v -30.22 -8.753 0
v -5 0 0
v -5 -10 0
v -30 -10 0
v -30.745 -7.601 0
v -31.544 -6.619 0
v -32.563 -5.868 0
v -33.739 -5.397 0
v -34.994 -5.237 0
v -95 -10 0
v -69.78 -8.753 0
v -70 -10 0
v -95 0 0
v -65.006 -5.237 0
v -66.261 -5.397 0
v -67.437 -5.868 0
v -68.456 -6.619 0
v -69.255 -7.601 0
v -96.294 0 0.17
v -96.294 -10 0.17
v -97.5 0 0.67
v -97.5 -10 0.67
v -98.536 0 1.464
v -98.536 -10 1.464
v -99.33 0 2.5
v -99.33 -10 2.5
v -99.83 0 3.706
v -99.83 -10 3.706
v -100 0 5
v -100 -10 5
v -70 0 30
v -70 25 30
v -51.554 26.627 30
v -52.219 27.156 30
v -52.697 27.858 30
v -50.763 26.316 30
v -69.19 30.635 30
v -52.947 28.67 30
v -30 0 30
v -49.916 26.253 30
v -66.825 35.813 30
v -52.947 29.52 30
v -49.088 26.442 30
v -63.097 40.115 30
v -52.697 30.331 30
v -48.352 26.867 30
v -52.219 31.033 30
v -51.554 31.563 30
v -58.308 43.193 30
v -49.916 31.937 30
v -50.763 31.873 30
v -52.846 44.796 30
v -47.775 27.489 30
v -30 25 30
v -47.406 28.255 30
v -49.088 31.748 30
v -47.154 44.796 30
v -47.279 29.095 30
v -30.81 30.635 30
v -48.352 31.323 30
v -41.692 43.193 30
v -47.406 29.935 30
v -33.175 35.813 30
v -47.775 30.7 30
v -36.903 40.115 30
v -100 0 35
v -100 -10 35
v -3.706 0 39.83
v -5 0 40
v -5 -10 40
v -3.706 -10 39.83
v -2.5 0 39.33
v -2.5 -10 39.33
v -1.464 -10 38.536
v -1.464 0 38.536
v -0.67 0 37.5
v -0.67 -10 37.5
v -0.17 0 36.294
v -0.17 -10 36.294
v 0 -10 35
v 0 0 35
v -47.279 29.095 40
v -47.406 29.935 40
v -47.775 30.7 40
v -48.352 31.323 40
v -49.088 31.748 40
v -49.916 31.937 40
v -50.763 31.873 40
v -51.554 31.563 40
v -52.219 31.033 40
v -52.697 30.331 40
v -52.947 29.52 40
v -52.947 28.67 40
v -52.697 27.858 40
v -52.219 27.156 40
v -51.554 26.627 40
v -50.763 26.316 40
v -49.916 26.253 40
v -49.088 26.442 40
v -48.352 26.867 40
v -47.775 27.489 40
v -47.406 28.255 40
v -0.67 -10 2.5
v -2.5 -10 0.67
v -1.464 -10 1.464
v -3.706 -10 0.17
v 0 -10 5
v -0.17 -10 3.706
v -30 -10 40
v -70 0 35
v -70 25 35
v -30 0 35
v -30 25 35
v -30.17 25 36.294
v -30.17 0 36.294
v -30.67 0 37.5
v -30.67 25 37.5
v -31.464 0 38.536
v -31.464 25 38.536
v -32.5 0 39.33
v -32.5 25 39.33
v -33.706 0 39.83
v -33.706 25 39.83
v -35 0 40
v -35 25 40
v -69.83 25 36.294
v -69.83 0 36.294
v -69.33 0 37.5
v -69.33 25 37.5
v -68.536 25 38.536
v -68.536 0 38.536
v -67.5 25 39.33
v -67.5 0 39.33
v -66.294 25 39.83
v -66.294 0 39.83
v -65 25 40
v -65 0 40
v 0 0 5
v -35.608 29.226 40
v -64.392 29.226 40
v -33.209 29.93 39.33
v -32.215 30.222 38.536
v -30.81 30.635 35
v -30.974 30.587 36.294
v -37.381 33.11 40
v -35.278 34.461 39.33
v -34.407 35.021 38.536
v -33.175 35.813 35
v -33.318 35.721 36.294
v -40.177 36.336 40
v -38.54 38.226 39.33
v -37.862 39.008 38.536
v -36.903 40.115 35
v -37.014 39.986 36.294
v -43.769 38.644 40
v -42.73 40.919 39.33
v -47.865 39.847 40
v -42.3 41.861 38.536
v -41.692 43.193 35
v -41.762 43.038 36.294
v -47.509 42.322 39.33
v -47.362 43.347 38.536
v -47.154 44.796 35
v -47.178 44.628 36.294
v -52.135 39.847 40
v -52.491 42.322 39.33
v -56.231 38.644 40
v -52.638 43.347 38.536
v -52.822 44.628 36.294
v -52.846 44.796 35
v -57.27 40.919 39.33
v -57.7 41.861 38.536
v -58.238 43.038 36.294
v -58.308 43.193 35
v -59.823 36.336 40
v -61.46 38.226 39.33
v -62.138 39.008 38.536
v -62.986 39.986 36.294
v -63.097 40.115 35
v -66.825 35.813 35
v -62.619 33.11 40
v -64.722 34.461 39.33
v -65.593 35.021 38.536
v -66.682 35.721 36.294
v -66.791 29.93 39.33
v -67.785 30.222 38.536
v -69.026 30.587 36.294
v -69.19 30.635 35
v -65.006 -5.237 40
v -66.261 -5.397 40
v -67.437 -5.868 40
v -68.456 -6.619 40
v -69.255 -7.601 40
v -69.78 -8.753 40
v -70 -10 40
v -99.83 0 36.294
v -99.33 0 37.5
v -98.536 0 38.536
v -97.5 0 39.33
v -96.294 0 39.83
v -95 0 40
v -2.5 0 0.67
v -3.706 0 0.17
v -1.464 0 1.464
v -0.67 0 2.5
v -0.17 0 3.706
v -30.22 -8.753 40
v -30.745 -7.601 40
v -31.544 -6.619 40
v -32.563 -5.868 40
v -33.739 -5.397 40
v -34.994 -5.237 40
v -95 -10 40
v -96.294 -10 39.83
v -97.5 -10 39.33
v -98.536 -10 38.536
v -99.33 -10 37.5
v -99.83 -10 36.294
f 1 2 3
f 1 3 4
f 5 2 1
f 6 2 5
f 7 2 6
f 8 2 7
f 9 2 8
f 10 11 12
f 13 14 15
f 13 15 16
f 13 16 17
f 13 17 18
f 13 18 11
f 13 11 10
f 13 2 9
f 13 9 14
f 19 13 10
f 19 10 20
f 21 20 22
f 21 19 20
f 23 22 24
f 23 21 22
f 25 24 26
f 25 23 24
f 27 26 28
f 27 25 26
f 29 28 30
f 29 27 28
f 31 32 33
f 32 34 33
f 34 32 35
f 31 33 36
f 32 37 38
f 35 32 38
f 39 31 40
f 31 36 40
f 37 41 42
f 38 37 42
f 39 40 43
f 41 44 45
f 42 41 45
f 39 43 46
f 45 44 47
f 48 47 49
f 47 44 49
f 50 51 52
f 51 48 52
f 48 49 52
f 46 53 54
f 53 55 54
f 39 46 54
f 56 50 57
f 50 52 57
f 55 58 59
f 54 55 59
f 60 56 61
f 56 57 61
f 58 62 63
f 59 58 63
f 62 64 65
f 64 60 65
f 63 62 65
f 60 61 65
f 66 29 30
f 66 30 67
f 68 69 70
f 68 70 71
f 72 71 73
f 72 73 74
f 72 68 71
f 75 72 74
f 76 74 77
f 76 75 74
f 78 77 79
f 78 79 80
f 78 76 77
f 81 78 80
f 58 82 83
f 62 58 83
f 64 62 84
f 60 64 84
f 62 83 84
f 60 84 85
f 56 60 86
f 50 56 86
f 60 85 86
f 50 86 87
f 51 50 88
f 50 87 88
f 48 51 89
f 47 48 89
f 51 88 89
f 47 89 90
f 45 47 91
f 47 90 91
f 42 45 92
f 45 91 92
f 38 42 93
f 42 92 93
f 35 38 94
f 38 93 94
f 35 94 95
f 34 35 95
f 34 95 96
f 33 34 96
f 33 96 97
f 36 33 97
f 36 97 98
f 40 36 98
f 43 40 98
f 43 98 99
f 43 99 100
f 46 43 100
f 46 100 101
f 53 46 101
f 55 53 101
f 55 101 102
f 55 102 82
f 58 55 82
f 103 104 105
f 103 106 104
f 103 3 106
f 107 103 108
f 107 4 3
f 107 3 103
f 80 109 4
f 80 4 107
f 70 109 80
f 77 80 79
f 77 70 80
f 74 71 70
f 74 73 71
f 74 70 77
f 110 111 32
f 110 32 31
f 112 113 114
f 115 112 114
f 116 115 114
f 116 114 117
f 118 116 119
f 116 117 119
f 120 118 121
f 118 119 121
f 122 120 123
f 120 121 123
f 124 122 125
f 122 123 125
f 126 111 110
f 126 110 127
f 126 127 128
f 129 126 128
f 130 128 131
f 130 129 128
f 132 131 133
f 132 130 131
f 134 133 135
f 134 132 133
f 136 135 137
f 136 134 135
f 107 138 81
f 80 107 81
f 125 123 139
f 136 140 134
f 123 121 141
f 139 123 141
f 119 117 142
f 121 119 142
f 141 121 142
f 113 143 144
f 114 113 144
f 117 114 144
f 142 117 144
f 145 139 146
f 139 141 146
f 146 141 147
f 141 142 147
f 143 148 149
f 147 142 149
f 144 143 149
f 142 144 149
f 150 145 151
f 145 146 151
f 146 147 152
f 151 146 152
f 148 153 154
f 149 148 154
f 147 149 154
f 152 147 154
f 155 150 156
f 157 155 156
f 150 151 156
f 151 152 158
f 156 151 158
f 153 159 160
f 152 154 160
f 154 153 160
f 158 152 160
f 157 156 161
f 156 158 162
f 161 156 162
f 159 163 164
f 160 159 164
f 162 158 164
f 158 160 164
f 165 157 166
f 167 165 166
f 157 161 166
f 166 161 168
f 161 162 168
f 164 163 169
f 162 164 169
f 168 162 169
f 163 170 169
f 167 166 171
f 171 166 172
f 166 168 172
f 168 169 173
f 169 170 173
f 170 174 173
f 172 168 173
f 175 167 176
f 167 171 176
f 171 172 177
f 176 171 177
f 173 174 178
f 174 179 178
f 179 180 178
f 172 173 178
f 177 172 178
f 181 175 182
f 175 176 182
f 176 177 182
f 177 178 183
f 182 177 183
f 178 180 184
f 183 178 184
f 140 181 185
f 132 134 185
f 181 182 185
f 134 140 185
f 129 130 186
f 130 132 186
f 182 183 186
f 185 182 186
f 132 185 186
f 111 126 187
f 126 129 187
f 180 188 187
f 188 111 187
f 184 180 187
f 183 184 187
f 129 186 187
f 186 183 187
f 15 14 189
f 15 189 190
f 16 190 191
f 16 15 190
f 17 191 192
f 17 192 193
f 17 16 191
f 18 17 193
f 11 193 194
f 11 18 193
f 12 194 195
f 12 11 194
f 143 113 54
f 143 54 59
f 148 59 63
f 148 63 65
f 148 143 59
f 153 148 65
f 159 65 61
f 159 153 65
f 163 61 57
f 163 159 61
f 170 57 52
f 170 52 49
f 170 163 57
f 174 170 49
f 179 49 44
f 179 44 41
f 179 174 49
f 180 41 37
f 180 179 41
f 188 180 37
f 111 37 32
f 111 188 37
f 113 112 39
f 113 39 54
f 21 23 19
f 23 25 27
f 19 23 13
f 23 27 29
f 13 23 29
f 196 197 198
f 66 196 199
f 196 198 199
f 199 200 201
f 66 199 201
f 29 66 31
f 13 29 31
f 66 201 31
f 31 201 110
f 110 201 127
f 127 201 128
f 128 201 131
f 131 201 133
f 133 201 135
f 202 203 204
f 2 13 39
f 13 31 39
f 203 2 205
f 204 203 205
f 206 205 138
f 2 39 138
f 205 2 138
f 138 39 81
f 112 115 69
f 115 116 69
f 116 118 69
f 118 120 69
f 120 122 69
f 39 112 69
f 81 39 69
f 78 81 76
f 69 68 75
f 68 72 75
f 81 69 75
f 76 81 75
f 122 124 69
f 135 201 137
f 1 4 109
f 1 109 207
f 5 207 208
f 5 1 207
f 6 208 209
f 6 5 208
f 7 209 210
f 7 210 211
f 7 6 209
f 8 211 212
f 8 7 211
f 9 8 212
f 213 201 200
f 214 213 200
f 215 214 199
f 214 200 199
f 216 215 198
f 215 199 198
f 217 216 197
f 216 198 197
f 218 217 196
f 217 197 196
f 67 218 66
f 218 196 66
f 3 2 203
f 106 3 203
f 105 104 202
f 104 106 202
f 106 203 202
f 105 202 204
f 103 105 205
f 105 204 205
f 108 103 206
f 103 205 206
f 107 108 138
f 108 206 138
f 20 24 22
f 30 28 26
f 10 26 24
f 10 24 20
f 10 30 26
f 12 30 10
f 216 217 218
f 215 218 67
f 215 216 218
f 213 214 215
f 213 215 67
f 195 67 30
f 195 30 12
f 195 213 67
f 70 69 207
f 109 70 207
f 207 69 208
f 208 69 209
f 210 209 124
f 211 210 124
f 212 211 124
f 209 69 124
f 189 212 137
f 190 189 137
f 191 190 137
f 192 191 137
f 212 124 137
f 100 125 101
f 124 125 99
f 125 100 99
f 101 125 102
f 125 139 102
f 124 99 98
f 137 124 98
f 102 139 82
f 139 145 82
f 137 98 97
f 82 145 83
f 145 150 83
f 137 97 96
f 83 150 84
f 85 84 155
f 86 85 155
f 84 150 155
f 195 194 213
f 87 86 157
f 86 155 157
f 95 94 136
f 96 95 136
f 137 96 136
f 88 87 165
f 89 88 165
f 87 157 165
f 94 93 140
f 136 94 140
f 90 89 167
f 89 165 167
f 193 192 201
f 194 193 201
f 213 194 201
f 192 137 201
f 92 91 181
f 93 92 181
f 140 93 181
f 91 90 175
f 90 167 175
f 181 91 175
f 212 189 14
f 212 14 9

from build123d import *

# Parameters (mm, degrees)
F0_W          = 100
F0_H          = 40
F1_DEPTH      = 10
F3_DEPTH      = 10
F4_W          = 40
F4_H          = 3
F5_DEPTH      = 174
F6_W          = 40
F6_H          = 4.7629310191
F7_DEPTH      = 40.001
F8_R          = 2.85
F9_DEPTH      = 40.001
F10_T1_DEPTH  = 40
F10_T3_DEPTH  = 40
F10_T5_DEPTH  = 35
F10_T7_DEPTH  = 35
F10_T9_DEPTH  = 35
F10_T11_DEPTH = 35
F10_T13_DEPTH = 25
F10_T16_ANGLE = 180


# Not quite as in the source:
# - a fillet or chamfer that OpenCascade refuses, or shapes differently, is made with other operations: its cross-section is extruded or revolved along the edge and cut away or added
# - two fillets or chamfers of one size are made in one step
# - an extrude ends at something that could not be found from the text; its depth is read off the source's solid


with BuildPart() as f1:
    # F0 (on Front) → F1 (new body)
    with BuildSketch(Plane.XZ):
        with Locations((-50, 20)):
            Rectangle(F0_W, F0_H)
    extrude(amount=F1_DEPTH)

    # F2 (on face) → F3 (join)
    with BuildSketch(Plane.XY.offset(40)):
        with BuildLine():
            Line((-70, 25), (-70, 0))
            Line((-70, 0), (-70, -10))
            Line((-70, -10), (-30, -10))
            Line((-30, -10), (-30, 0))
            Line((-30, 0), (-30, 25))
            ThreePointArc((-30, 25), (-50, 45), (-70, 25))
        make_face()
        with BuildLine():
            Line((-70, 25), (-70, 0))
            Line((-70, 0), (-30, 0))
            Line((-30, 0), (-30, 25))
            ThreePointArc((-30, 25), (-50, 45), (-70, 25))
        make_face()
    extrude(amount=-F3_DEPTH)

    # F4 (on face) → F5 (cut, through all)
    with BuildSketch(Plane.XY.offset(40)):
        with Locations((-50, -8.5)):
            Rectangle(F4_W, F4_H)
    extrude(amount=F5_DEPTH, mode=Mode.SUBTRACT)

    # F6 (on face) → F7 (cut, through all)
    with BuildSketch(Plane.XY.offset(40)):
        with Locations((-50, -7.6185344905)):
            Rectangle(F6_W, F6_H)
    extrude(amount=-F7_DEPTH, mode=Mode.SUBTRACT)

    # F8 (on face) → F9 (cut, through all)
    with BuildSketch(Plane.XY.offset(40)):
        with Locations((-50.1293092966, 29.0948301554)):
            Circle(F8_R)
    extrude(amount=-F9_DEPTH, mode=Mode.SUBTRACT)

    # F10: fillet of radius 5 on 9 edges, made by hand

    # F10_s2 → F10_t1 (join)
    with BuildSketch(Plane.XY):
        with BuildLine():
            ThreePointArc((-30, -10), (-31.543677094, -6.6186891705), (-34.9943766676, -5.2370689809))
            Line((-34.9943766676, -5.2370689809), (-30, -5.2370689809))
            Line((-30, -5.2370689809), (-30, -10))
        make_face()
    extrude(amount=F10_T1_DEPTH)

    # F10_s4 → F10_t3 (join)
    with BuildSketch(Plane.XY):
        with BuildLine():
            ThreePointArc((-65.0056233324, -5.2370689809), (-68.456322906, -6.6186891705), (-70, -10))
            Line((-70, -10), (-70, -5.2370689809))
            Line((-70, -5.2370689809), (-65.0056233324, -5.2370689809))
        make_face()
    extrude(amount=F10_T3_DEPTH)

    # F10_s6 → F10_t5 (cut)
    with BuildSketch(Plane.XZ.offset(-12.5)):
        with BuildLine():
            ThreePointArc((-5, 0), (-1.4644660941, 1.4644660941), (0, 5))
            Line((0, 5), (0, 0))
            Line((0, 0), (-5, 0))
        make_face()
    extrude(amount=F10_T5_DEPTH, mode=Mode.SUBTRACT)

    # F10_s8 → F10_t7 (cut)
    with BuildSketch(Plane.XZ.offset(-12.5)):
        with BuildLine():
            ThreePointArc((-95, 0), (-98.5355339059, 1.4644660941), (-100, 5))
            Line((-100, 5), (-100, 0))
            Line((-100, 0), (-95, 0))
        make_face()
    extrude(amount=F10_T7_DEPTH, mode=Mode.SUBTRACT)

    # F10_s10 → F10_t9 (cut)
    with BuildSketch(Plane.XZ.offset(-12.5)):
        with BuildLine():
            ThreePointArc((-5, 40), (-1.4644660941, 38.5355339059), (0, 35))
            Line((0, 35), (0, 40))
            Line((0, 40), (-5, 40))
        make_face()
    extrude(amount=F10_T9_DEPTH, mode=Mode.SUBTRACT)

    # F10_s12 → F10_t11 (cut)
    with BuildSketch(Plane.XZ.offset(-12.5)):
        with BuildLine():
            ThreePointArc((-95, 40), (-98.5355339059, 38.5355339059), (-100, 35))
            Line((-100, 35), (-100, 40))
            Line((-100, 40), (-95, 40))
        make_face()
    extrude(amount=F10_T11_DEPTH, mode=Mode.SUBTRACT)

    # F10_s14 → F10_t13 (cut)
    with BuildSketch(Plane.XZ.offset(-25)):
        with BuildLine():
            ThreePointArc((-70, 35), (-68.5355339059, 38.5355339059), (-65, 40))
            Line((-65, 40), (-70, 40))
            Line((-70, 40), (-70, 35))
        make_face()
        with BuildLine():
            ThreePointArc((-30, 35), (-31.4644660941, 38.5355339059), (-35, 40))
            Line((-35, 40), (-30, 40))
            Line((-30, 40), (-30, 35))
        make_face()
    extrude(amount=F10_T13_DEPTH, mode=Mode.SUBTRACT)

    # F10_s15 → F10_t16 (revolve, cut)
    with BuildSketch(Plane.XZ.offset(-25)):
        with BuildLine():
            ThreePointArc((-35, 40), (-31.4644660941, 38.5355339059), (-30, 35))
            Line((-30, 35), (-30, 40))
            Line((-30, 40), (-35, 40))
        make_face()
    revolve(axis=Axis((-50, 25, 40), (0, 0, 1)), revolution_arc=F10_T16_ANGLE, mode=Mode.SUBTRACT)


solid = f1.part
